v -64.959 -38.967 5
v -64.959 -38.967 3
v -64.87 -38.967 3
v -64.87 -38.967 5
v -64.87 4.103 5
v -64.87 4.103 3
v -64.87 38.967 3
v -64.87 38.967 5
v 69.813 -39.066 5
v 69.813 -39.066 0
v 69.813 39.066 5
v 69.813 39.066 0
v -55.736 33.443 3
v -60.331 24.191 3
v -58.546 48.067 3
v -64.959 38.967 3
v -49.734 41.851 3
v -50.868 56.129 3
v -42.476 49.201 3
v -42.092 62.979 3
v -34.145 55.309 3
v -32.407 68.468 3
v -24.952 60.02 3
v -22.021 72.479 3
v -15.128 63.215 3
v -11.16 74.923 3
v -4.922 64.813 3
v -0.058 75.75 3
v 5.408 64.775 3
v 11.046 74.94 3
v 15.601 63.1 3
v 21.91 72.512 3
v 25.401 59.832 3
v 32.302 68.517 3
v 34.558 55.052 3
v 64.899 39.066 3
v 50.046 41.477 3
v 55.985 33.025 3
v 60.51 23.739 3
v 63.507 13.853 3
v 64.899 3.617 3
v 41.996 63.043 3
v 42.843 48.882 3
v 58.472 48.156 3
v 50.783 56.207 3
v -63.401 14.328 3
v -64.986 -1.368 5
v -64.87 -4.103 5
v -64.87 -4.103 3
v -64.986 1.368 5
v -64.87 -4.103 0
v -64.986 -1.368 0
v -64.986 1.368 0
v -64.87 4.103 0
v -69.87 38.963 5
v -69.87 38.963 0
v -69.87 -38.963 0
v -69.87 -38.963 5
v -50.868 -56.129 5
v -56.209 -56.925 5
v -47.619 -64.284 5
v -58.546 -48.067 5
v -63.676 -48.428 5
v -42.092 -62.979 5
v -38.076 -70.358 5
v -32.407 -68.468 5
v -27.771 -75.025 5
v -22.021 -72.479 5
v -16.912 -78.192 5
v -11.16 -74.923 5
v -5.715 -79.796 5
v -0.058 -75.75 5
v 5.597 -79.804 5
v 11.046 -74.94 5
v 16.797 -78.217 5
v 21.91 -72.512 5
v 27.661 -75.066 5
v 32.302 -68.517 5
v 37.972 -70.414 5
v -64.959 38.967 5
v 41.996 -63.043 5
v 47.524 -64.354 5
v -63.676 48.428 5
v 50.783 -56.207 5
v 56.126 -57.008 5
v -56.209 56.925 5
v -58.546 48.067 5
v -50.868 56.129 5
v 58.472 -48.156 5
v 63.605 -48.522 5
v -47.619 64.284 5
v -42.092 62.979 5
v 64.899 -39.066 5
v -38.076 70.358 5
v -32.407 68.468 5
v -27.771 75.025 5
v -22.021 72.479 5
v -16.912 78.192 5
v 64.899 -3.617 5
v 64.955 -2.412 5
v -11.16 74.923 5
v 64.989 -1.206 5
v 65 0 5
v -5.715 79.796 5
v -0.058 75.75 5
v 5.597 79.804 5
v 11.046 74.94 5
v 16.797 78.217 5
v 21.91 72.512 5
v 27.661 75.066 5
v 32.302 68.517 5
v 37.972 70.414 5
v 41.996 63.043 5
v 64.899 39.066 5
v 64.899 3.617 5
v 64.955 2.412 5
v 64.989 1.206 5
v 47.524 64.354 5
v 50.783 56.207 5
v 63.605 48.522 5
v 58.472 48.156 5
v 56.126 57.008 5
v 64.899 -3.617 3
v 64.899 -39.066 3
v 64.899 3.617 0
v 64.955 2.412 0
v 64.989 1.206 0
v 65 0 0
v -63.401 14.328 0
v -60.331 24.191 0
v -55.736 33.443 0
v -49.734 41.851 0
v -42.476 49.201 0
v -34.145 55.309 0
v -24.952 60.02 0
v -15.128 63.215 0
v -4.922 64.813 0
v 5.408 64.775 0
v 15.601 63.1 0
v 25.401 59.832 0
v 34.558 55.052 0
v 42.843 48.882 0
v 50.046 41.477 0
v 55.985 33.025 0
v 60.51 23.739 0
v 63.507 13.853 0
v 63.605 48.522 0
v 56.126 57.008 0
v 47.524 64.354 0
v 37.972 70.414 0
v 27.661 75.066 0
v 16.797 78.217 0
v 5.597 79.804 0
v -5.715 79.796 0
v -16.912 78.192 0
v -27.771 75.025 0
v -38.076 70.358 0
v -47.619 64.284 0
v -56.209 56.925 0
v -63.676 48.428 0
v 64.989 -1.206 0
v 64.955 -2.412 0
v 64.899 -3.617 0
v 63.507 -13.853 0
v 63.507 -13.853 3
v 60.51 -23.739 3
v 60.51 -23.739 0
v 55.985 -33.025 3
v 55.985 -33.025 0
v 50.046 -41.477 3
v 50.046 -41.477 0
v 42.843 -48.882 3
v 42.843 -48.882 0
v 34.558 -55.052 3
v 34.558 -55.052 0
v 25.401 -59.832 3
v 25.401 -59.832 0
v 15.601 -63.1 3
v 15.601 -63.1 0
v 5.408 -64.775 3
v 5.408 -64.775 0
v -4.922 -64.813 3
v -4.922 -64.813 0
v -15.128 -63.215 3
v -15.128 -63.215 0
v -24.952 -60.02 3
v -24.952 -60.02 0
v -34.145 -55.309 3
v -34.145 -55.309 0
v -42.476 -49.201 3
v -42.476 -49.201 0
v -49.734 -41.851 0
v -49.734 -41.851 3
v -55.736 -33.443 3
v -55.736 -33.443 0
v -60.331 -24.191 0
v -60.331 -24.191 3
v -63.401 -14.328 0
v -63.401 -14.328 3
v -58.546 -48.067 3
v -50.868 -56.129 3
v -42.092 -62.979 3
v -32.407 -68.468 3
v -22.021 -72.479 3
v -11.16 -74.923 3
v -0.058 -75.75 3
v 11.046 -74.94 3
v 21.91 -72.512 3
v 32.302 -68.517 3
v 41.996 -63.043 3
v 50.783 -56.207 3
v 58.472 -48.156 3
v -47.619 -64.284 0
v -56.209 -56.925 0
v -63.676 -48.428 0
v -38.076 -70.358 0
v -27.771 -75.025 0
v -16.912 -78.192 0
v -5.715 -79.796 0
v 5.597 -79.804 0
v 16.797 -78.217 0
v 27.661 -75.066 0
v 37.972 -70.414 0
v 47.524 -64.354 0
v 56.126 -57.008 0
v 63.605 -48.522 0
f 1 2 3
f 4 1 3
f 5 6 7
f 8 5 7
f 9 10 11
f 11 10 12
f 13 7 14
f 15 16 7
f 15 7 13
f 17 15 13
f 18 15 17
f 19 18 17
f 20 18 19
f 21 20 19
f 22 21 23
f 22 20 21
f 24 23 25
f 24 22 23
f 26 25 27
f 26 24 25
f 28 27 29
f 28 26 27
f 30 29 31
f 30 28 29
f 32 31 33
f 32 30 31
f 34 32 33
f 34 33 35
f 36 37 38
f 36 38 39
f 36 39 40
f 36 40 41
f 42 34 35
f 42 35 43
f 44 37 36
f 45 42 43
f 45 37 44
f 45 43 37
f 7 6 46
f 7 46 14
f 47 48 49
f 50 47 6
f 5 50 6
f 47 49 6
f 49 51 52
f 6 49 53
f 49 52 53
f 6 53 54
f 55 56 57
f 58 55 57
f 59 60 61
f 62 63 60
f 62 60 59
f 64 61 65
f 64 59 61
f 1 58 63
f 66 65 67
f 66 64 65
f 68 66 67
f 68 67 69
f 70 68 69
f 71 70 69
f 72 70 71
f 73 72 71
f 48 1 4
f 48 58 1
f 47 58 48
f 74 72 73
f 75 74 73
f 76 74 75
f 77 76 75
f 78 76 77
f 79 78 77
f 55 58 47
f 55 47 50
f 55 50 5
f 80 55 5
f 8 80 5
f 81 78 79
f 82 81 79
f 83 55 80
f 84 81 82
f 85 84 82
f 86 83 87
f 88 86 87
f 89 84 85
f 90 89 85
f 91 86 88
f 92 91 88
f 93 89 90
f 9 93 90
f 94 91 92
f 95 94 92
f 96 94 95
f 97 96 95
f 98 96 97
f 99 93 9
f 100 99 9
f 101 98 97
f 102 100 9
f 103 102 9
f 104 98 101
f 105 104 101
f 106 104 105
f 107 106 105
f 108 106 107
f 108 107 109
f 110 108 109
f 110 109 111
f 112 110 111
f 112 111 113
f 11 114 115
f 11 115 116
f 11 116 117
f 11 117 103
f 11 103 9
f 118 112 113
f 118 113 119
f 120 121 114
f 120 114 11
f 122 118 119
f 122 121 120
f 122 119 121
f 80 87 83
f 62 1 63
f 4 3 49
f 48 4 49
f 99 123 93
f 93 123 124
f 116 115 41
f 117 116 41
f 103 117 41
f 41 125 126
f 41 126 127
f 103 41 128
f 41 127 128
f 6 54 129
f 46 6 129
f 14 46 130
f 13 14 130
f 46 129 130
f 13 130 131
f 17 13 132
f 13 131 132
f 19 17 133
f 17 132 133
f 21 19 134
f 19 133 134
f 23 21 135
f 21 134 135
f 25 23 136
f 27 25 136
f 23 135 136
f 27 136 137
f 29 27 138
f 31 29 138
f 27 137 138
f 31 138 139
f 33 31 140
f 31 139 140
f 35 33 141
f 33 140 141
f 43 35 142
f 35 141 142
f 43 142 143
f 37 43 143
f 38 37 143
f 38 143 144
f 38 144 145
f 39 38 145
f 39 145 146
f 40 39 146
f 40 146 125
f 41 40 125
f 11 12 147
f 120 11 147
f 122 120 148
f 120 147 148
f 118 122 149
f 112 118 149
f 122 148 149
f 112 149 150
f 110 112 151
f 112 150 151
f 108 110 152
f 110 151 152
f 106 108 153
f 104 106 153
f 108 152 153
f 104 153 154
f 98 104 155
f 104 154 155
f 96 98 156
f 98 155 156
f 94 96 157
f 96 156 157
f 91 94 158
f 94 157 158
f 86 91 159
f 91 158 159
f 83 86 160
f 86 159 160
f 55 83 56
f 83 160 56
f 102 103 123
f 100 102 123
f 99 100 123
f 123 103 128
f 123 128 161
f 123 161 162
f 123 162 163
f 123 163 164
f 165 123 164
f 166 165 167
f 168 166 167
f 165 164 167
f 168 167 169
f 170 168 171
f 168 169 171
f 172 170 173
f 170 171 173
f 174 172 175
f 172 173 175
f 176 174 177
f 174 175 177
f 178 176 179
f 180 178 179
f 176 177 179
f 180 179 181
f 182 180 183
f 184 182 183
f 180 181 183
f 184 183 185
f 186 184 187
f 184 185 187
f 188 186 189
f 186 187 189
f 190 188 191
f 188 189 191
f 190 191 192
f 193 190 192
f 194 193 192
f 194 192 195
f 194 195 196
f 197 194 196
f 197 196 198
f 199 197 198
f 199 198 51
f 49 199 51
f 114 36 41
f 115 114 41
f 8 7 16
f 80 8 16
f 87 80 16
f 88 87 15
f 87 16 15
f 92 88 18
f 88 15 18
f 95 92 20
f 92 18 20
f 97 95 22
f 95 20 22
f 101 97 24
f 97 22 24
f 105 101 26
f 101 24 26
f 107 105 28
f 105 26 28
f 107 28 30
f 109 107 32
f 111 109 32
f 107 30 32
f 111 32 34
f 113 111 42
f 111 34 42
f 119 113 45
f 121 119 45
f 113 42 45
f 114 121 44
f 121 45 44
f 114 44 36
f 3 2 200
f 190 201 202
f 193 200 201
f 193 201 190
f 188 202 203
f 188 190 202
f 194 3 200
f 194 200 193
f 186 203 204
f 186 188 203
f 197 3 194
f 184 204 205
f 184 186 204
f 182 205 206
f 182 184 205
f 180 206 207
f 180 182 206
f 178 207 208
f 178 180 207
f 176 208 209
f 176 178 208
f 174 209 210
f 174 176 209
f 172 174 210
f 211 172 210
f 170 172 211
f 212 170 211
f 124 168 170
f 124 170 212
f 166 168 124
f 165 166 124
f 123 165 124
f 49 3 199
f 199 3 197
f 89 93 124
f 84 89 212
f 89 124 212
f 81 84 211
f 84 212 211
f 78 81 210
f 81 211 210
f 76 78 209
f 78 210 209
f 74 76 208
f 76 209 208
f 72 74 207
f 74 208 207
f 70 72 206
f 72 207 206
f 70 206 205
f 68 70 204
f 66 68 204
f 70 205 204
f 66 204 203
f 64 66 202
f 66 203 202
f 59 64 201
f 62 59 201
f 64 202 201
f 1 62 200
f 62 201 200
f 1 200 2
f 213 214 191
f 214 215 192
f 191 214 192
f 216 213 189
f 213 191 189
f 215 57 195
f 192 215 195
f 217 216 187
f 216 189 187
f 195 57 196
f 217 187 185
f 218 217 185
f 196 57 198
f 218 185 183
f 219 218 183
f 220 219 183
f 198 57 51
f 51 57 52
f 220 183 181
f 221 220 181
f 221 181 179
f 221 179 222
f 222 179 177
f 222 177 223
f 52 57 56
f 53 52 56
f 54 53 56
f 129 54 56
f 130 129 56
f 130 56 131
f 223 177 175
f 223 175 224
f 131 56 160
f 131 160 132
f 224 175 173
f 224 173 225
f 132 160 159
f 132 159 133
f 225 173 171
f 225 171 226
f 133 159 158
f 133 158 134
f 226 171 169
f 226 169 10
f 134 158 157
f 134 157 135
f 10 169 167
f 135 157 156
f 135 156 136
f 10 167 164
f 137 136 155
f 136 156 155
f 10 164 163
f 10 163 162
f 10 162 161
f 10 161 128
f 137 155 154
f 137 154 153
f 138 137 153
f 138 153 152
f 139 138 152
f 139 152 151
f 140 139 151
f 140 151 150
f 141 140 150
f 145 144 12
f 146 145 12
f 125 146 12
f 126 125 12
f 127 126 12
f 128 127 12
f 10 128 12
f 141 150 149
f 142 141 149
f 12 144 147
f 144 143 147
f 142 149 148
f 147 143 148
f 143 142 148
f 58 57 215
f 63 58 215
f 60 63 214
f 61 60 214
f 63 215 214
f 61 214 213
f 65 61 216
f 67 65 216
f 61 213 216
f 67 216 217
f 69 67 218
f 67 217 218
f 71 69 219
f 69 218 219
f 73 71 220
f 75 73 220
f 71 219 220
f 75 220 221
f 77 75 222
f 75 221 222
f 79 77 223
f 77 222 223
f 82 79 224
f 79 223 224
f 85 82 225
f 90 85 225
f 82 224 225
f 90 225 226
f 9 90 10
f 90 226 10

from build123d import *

# Parameters (mm, degrees)
F1_DEPTH = 5
F2_DEPTH = 3


with BuildPart() as f1:
    # F0 (on Top) → F1 (new body)
    with BuildSketch(Plane.XY):
        with BuildLine():
            Line((64.8992869691, 39.065906503), (69.8129998574, 39.065906503))
            ThreePointArc((69.8129998574, 39.065906503), (-0.0588261188, 79.9999783718), (-69.8703767369, 38.9631935889))
            Line((-69.8703767369, 38.9631935889), (-64.9588376934, 38.9668051747))
            ThreePointArc((-64.9588376934, 38.9668051747), (-0.0578086543, 75.7499779416), (64.8992869691, 39.065906503))
        make_face()
        with BuildLine():
            ThreePointArc((-64.9588376934, 38.9668051747), (-67.5890599234, 34.2020683392), (-69.8703767369, 29.2607750179))
            Line((-69.8703767369, 29.2607750179), (-69.8703767369, -29.2607750179))
            ThreePointArc((-69.8703767369, -29.2607750179), (-67.5890599234, -34.2020683392), (-64.9588376934, -38.9668051747))
            Line((-64.9588376934, -38.9668051747), (-64.8703767369, -38.9668702224))
            Line((-64.8703767369, -38.9668702224), (-64.8703767369, -4.1029528413))
            ThreePointArc((-64.8703767369, -4.1029528413), (-65, 0), (-64.8703767369, 4.1029528413))
            Line((-64.8703767369, 4.1029528413), (-64.8703767369, 38.9668702224))
            Line((-64.8703767369, 38.9668702224), (-64.9588376934, 38.9668051747))
        make_face()
        with BuildLine():
            Line((-64.9588376934, 38.9668051747), (-69.8703767369, 38.9631935889))
            Line((-69.8703767369, 38.9631935889), (-69.8703767369, 29.2607750179))
            ThreePointArc((-69.8703767369, 29.2607750179), (-67.5890599234, 34.2020683392), (-64.9588376934, 38.9668051747))
        make_face()
        with BuildLine():
            Line((-69.8703767369, -29.2607750179), (-69.8703767369, -38.9631935889))
            Line((-69.8703767369, -38.9631935889), (-64.9588376934, -38.9668051747))
            ThreePointArc((-64.9588376934, -38.9668051747), (-67.5890599234, -34.2020683392), (-69.8703767369, -29.2607750179))
        make_face()
        with BuildLine():
            ThreePointArc((-69.8703767369, -38.9631935889), (-0.0588261188, -79.9999783718), (69.8129998574, -39.065906503))
            Line((69.8129998574, -39.065906503), (64.8992869691, -39.065906503))
            ThreePointArc((64.8992869691, -39.065906503), (-0.0578086543, -75.7499779416), (-64.9588376934, -38.9668051747))
            Line((-64.9588376934, -38.9668051747), (-69.8703767369, -38.9631935889))
        make_face()
        with BuildLine():
            Line((69.8129998574, -29.397407214), (69.8129998574, 29.397407214))
            ThreePointArc((69.8129998574, 29.397407214), (67.5294011904, 34.3197097142), (64.8992869691, 39.065906503))
            Line((64.8992869691, 39.065906503), (64.8992869691, 3.6169809102))
            ThreePointArc((64.8992869691, 3.6169809102), (64.9748168639, 1.8091913953), (65, 0))
            ThreePointArc((65, 0), (64.9748168639, -1.8091913953), (64.8992869691, -3.6169809102))
            Line((64.8992869691, -3.6169809102), (64.8992869691, -39.065906503))
            ThreePointArc((64.8992869691, -39.065906503), (67.5294011904, -34.3197097142), (69.8129998574, -29.397407214))
        make_face()
        with BuildLine():
            Line((64.8992869691, -39.065906503), (69.8129998574, -39.065906503))
            Line((69.8129998574, -39.065906503), (69.8129998574, -29.397407214))
            ThreePointArc((69.8129998574, -29.397407214), (67.5294011904, -34.3197097142), (64.8992869691, -39.065906503))
        make_face()
        with BuildLine():
            Line((69.8129998574, 29.397407214), (69.8129998574, 39.065906503))
            Line((69.8129998574, 39.065906503), (64.8992869691, 39.065906503))
            ThreePointArc((64.8992869691, 39.065906503), (67.5294011904, 34.3197097142), (69.8129998574, 29.397407214))
        make_face()
    extrude(amount=F1_DEPTH)

    # F0 (on Top) → F2 (join)
    with BuildSketch(Plane.XY):
        with BuildLine():
            ThreePointArc((-64.9588376934, -38.9668051747), (-0.0578086543, -75.7499779416), (64.8992869691, -39.065906503))
            Line((64.8992869691, -39.065906503), (64.8992869691, -3.6169809102))
            ThreePointArc((64.8992869691, -3.6169809102), (0.2434155497, -64.9995442205), (-64.8703767369, -4.1029528413))
            Line((-64.8703767369, -4.1029528413), (-64.8703767369, -38.9668702224))
            Line((-64.8703767369, -38.9668702224), (-64.9588376934, -38.9668051747))
        make_face()
        with BuildLine():
            Line((64.8992869691, 3.6169809102), (64.8992869691, 39.065906503))
            ThreePointArc((64.8992869691, 39.065906503), (-0.0578086543, 75.7499779416), (-64.9588376934, 38.9668051747))
            Line((-64.9588376934, 38.9668051747), (-64.8703767369, 38.9668702224))
            Line((-64.8703767369, 38.9668702224), (-64.8703767369, 4.1029528413))
            ThreePointArc((-64.8703767369, 4.1029528413), (0.2434155497, 64.9995442205), (64.8992869691, 3.6169809102))
        make_face()
    extrude(amount=F2_DEPTH)


solid = f1.part
